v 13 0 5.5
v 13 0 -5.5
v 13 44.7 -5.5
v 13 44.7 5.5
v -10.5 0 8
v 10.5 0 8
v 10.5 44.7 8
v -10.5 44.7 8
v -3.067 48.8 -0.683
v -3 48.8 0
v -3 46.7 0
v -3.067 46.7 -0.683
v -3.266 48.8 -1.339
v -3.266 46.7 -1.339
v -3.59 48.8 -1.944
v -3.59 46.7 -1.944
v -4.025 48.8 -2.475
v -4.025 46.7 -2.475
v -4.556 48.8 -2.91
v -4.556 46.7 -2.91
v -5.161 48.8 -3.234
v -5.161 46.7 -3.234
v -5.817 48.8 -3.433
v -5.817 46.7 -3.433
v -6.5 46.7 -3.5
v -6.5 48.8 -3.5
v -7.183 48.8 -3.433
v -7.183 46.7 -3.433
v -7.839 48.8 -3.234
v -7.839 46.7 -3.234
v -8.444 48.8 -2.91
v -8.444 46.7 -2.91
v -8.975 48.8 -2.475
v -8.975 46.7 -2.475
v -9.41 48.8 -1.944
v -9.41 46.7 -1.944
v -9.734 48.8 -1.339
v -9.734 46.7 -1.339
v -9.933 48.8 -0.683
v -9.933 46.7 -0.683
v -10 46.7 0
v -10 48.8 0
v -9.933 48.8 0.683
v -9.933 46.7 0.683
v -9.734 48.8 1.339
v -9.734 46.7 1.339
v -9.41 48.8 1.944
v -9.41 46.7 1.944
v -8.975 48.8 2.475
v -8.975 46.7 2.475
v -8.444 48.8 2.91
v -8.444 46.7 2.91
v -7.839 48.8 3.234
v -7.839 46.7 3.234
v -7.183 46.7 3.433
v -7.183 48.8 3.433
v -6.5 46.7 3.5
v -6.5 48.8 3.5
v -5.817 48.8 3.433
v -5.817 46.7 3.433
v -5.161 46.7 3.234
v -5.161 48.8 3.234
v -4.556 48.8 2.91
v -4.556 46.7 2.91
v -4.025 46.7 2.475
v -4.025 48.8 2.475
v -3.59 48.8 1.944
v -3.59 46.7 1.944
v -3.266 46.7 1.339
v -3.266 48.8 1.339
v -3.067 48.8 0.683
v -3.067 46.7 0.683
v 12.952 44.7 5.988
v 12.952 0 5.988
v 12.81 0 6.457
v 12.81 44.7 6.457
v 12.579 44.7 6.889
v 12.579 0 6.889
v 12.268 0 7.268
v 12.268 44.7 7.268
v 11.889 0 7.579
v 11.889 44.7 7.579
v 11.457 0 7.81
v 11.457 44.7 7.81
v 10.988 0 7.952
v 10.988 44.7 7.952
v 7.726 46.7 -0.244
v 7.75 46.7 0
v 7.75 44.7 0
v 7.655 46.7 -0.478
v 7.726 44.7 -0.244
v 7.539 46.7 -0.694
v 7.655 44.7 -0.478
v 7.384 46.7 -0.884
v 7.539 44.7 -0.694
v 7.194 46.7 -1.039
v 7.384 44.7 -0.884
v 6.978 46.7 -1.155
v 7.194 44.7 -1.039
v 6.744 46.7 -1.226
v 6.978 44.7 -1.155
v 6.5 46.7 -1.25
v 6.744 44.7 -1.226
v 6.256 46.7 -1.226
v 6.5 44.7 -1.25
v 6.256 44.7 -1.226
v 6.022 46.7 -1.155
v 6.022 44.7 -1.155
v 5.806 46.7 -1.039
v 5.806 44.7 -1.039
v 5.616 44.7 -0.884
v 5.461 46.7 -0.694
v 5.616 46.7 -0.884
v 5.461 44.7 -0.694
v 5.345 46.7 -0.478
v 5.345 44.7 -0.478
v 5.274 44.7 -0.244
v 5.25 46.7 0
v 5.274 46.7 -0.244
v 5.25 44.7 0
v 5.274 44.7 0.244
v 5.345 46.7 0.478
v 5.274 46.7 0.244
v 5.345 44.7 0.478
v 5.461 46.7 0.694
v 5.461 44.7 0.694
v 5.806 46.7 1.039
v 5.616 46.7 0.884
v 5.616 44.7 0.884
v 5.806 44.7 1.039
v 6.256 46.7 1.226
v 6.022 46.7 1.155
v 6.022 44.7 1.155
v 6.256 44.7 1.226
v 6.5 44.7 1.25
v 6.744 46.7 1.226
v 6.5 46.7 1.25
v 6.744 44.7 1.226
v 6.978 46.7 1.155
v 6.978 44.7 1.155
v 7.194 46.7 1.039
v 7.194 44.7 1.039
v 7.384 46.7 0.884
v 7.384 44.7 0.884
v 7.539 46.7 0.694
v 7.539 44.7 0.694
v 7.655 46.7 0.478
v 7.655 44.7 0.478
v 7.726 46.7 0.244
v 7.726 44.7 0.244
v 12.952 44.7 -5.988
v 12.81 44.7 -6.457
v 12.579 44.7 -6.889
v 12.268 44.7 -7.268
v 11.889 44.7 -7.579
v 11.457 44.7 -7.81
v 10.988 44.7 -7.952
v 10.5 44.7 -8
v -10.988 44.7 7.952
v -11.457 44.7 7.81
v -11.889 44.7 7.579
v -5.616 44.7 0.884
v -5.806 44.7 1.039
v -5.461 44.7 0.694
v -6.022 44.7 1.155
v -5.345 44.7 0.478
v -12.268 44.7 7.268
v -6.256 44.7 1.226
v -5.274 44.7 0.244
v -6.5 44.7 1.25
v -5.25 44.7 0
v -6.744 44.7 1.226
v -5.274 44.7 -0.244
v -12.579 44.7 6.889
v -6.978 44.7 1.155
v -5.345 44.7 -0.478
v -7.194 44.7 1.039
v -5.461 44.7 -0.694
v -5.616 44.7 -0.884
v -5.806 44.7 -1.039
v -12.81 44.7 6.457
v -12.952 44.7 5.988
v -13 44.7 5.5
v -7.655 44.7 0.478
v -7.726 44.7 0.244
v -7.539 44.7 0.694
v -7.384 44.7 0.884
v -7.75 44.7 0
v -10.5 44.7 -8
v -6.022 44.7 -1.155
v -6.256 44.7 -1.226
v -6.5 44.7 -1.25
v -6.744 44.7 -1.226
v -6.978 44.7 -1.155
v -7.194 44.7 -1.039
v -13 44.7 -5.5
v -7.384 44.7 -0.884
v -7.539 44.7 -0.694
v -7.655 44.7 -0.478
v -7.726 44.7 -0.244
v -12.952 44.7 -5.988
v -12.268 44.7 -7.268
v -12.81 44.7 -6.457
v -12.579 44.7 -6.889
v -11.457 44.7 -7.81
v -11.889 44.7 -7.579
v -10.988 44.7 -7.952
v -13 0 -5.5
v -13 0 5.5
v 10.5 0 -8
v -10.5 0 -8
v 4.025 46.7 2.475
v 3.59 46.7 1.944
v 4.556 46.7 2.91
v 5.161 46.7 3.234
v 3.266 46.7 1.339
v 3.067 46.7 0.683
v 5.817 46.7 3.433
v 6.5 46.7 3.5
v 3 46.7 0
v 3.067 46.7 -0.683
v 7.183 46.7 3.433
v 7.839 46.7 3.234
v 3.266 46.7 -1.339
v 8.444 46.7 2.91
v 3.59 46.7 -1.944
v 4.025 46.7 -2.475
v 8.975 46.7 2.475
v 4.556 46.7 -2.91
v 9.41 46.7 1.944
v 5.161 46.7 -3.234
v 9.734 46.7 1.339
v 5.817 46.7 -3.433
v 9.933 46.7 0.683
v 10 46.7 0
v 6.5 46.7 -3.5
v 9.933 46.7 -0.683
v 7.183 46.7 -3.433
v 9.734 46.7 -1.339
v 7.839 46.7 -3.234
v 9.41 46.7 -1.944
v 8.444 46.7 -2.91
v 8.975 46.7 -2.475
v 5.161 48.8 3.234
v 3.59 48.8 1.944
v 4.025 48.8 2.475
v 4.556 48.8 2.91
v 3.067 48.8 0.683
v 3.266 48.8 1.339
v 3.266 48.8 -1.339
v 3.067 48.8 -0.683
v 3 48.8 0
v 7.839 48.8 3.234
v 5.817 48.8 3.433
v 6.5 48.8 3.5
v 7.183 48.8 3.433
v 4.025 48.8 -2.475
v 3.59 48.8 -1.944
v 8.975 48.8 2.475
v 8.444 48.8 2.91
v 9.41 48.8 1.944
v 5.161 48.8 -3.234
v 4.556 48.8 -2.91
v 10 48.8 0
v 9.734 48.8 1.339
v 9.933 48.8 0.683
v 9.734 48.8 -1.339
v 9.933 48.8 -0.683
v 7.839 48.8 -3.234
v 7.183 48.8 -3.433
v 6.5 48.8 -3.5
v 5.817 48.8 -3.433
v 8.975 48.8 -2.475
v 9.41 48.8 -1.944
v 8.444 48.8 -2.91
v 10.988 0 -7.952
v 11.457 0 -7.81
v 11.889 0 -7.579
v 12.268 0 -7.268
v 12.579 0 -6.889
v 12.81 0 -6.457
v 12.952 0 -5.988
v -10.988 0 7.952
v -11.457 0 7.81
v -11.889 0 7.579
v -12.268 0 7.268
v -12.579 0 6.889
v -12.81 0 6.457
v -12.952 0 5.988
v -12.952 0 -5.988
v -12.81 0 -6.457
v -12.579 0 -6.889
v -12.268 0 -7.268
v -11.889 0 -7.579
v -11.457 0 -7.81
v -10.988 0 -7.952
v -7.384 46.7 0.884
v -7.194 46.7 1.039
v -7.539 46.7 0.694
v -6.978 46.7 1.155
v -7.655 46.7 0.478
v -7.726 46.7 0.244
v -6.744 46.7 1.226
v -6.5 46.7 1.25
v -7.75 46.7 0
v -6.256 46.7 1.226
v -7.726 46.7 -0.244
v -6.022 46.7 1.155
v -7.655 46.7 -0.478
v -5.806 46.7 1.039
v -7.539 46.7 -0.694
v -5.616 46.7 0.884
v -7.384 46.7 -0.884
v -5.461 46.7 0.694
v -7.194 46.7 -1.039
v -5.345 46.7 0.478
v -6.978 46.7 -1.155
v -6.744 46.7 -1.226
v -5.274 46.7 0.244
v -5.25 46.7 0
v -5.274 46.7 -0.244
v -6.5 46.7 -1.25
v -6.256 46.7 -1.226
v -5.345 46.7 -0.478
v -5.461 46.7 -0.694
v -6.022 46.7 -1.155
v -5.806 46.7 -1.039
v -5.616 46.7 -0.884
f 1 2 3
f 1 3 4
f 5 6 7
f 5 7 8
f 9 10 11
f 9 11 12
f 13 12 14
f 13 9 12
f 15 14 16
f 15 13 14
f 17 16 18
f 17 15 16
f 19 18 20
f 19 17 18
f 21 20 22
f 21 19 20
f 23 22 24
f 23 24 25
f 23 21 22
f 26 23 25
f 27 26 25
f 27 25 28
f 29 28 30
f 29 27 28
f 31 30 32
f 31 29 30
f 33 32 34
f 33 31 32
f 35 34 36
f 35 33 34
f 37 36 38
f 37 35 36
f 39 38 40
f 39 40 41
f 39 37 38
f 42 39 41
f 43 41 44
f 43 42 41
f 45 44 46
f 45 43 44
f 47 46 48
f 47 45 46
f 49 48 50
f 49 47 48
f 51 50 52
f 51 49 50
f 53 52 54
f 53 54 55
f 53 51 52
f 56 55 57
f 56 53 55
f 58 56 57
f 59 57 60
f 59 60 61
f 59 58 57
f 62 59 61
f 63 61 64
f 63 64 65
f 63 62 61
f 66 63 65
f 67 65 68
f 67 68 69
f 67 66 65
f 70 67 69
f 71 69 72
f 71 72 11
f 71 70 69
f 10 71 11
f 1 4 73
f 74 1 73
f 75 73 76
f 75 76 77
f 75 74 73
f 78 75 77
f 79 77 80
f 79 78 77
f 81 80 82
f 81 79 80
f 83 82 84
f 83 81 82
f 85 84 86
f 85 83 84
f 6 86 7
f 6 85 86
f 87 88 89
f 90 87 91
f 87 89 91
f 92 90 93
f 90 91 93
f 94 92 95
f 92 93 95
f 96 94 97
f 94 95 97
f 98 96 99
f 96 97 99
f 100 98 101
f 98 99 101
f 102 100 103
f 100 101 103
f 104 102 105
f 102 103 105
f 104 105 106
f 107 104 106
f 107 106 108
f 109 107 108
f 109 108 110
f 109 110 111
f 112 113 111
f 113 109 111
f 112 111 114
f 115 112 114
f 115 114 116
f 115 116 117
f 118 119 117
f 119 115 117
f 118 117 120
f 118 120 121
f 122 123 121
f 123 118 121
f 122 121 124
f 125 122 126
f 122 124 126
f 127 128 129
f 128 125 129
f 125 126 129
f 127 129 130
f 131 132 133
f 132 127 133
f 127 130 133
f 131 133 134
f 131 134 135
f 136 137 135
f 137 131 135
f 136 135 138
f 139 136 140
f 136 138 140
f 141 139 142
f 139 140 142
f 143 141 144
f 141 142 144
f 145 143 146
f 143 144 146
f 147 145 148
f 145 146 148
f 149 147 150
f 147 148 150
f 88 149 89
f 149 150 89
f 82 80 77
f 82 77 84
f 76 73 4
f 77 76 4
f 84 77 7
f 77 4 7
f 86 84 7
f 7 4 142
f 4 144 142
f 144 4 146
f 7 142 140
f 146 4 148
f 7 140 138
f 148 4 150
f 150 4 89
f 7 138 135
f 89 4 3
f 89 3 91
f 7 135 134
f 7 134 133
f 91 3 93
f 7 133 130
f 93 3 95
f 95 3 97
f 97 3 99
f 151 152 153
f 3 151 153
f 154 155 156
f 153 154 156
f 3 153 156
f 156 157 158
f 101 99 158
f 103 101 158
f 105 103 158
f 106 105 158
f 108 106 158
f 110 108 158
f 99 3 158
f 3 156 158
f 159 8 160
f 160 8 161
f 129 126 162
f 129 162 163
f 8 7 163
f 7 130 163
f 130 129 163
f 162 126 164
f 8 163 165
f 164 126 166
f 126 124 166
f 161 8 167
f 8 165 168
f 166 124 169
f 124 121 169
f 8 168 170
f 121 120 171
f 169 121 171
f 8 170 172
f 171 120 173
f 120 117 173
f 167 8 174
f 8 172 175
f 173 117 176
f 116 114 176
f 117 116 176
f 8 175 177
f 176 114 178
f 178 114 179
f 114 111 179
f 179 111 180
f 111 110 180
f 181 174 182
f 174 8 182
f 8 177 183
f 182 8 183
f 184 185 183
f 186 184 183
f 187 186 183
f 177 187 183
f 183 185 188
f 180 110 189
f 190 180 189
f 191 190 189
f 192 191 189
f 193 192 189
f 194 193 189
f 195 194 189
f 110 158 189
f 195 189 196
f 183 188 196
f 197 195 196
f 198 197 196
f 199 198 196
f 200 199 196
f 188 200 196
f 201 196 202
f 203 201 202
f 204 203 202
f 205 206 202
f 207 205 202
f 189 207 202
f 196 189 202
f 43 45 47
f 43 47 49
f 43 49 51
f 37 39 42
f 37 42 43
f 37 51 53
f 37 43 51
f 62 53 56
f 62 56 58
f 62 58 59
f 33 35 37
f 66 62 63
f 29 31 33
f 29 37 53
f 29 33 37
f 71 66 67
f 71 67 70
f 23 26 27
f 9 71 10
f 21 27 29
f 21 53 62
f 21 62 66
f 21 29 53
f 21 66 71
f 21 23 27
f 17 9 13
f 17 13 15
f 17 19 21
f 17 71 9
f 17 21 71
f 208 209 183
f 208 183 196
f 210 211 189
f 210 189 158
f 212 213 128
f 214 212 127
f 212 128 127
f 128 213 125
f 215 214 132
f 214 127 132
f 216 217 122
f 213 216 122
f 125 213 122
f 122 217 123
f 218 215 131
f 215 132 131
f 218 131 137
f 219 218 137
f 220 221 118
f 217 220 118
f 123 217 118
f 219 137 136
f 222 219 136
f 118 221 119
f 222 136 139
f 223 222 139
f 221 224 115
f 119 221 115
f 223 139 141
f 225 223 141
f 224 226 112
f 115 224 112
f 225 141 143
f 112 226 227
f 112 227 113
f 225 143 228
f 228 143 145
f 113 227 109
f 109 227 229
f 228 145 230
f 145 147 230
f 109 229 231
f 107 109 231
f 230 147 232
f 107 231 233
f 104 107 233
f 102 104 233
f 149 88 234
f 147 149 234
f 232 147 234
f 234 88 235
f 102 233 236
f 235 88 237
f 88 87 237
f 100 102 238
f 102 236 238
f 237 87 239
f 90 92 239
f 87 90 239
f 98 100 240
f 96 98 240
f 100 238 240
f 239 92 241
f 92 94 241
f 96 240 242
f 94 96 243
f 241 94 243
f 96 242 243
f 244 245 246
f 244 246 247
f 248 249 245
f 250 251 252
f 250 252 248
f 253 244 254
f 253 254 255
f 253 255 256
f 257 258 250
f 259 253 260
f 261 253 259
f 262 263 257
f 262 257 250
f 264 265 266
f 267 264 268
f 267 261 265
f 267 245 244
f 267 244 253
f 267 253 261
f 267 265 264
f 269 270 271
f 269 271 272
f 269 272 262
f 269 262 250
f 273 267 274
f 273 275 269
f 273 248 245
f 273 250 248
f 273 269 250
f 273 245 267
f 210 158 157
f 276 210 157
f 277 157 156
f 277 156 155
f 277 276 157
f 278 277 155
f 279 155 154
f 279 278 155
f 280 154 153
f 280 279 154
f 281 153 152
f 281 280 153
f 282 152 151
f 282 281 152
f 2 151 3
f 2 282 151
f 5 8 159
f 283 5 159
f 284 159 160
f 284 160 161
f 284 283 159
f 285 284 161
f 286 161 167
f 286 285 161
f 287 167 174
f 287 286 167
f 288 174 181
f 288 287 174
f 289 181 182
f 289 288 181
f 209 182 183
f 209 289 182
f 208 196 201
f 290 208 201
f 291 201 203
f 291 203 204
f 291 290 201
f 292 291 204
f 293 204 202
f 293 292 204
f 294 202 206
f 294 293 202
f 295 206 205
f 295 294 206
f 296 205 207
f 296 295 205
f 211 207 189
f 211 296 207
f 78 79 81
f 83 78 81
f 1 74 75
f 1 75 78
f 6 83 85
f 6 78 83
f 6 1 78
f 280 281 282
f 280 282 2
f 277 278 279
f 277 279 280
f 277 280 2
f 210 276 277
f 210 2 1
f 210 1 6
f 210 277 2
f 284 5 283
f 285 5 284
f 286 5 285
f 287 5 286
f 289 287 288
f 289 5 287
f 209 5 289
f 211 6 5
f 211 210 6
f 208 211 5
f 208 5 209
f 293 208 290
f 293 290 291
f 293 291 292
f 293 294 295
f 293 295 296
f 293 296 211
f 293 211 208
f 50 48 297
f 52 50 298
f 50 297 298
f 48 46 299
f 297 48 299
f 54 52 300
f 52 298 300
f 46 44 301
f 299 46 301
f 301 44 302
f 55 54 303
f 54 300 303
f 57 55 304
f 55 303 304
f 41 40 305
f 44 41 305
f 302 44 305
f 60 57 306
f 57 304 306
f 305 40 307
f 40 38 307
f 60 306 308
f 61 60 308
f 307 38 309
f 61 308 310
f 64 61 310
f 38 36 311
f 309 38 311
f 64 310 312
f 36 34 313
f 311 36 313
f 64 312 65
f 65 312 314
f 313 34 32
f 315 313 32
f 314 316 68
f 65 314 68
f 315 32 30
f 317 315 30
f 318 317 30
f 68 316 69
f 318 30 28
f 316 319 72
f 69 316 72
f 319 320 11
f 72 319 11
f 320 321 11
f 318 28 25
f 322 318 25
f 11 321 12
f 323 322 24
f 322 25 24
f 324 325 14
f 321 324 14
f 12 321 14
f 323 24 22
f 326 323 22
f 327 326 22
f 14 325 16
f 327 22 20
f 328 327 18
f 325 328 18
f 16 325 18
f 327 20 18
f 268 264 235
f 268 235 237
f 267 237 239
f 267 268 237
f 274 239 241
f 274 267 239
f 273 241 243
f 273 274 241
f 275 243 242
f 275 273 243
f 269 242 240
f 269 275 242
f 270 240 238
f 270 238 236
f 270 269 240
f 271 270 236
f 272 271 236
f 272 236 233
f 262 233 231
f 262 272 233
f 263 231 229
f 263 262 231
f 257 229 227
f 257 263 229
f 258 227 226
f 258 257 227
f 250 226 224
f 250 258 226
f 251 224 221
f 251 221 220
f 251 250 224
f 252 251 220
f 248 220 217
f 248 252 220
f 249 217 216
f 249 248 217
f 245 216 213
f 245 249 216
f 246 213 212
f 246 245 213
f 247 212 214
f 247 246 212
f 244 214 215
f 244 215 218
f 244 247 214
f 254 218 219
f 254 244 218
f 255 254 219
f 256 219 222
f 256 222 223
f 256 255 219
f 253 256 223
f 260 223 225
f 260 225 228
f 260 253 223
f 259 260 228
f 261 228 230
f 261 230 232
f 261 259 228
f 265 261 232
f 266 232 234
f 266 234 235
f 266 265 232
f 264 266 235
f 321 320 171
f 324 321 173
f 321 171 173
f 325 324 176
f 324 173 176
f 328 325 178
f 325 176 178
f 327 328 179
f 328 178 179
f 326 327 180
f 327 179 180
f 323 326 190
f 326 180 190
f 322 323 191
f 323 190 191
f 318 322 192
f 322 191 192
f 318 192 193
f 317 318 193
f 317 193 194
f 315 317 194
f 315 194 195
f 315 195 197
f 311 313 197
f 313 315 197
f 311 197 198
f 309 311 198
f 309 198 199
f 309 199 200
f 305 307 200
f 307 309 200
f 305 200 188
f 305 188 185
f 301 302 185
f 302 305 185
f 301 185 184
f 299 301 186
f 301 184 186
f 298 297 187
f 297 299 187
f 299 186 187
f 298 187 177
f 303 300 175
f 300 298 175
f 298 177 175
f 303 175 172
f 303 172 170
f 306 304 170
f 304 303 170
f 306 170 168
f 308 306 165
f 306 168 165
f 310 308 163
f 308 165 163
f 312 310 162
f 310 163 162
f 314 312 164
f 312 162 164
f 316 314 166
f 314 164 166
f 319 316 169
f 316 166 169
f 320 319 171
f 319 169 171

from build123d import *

# Parameters (mm, degrees)
BOSS_EXTRUDE1_DEPTH = 44.7
SKETCH2_R           = 1.25
BOSS_EXTRUDE2_DEPTH = 4.1
SKETCH3_R           = 3.5
BOSS_EXTRUDE3_DEPTH = 2.1


with BuildPart() as part:
    # Sketch1 → Boss-Extrude1 (new body)
    with BuildSketch(Plane(origin=(0, 0, 0), x_dir=(1, 0, 0), z_dir=(0, 1, 0))):
        with BuildLine():
            Line((-10.5, 8), (10.5, 8))
            ThreePointArc((10.5, 8), (12.267766953, 7.267766953), (13, 5.5))
            Line((13, 5.5), (13, -5.5))
            ThreePointArc((13, -5.5), (12.267766953, -7.267766953), (10.5, -8))
            Line((10.5, -8), (-10.5, -8))
            ThreePointArc((-10.5, -8), (-12.267766953, -7.267766953), (-13, -5.5))
            Line((-13, -5.5), (-13, 5.5))
            ThreePointArc((-13, 5.5), (-12.267766953, 7.267766953), (-10.5, 8))
        make_face()
    extrude(amount=BOSS_EXTRUDE1_DEPTH)

    # Sketch2 → Boss-Extrude2 (add)
    with BuildSketch(Plane(origin=(0, 44.7, 0), x_dir=(1, 0, 0), z_dir=(0, 1, 0))):
        with Locations((-6.5, 0)):
            Circle(SKETCH2_R)
        with Locations((6.5, 0)):
            Circle(SKETCH2_R)
    extrude(amount=BOSS_EXTRUDE2_DEPTH)

    # Sketch3 → Boss-Extrude3 (add)
    with BuildSketch(Plane(origin=(0, 48.8, 0), x_dir=(1, 0, 0), z_dir=(0, 1, 0))):
        with Locations((-6.5, 0)):
            Circle(SKETCH3_R)
        with Locations((6.5, 0)):
            Circle(SKETCH3_R)
    extrude(amount=-BOSS_EXTRUDE3_DEPTH)


solid = part.part
